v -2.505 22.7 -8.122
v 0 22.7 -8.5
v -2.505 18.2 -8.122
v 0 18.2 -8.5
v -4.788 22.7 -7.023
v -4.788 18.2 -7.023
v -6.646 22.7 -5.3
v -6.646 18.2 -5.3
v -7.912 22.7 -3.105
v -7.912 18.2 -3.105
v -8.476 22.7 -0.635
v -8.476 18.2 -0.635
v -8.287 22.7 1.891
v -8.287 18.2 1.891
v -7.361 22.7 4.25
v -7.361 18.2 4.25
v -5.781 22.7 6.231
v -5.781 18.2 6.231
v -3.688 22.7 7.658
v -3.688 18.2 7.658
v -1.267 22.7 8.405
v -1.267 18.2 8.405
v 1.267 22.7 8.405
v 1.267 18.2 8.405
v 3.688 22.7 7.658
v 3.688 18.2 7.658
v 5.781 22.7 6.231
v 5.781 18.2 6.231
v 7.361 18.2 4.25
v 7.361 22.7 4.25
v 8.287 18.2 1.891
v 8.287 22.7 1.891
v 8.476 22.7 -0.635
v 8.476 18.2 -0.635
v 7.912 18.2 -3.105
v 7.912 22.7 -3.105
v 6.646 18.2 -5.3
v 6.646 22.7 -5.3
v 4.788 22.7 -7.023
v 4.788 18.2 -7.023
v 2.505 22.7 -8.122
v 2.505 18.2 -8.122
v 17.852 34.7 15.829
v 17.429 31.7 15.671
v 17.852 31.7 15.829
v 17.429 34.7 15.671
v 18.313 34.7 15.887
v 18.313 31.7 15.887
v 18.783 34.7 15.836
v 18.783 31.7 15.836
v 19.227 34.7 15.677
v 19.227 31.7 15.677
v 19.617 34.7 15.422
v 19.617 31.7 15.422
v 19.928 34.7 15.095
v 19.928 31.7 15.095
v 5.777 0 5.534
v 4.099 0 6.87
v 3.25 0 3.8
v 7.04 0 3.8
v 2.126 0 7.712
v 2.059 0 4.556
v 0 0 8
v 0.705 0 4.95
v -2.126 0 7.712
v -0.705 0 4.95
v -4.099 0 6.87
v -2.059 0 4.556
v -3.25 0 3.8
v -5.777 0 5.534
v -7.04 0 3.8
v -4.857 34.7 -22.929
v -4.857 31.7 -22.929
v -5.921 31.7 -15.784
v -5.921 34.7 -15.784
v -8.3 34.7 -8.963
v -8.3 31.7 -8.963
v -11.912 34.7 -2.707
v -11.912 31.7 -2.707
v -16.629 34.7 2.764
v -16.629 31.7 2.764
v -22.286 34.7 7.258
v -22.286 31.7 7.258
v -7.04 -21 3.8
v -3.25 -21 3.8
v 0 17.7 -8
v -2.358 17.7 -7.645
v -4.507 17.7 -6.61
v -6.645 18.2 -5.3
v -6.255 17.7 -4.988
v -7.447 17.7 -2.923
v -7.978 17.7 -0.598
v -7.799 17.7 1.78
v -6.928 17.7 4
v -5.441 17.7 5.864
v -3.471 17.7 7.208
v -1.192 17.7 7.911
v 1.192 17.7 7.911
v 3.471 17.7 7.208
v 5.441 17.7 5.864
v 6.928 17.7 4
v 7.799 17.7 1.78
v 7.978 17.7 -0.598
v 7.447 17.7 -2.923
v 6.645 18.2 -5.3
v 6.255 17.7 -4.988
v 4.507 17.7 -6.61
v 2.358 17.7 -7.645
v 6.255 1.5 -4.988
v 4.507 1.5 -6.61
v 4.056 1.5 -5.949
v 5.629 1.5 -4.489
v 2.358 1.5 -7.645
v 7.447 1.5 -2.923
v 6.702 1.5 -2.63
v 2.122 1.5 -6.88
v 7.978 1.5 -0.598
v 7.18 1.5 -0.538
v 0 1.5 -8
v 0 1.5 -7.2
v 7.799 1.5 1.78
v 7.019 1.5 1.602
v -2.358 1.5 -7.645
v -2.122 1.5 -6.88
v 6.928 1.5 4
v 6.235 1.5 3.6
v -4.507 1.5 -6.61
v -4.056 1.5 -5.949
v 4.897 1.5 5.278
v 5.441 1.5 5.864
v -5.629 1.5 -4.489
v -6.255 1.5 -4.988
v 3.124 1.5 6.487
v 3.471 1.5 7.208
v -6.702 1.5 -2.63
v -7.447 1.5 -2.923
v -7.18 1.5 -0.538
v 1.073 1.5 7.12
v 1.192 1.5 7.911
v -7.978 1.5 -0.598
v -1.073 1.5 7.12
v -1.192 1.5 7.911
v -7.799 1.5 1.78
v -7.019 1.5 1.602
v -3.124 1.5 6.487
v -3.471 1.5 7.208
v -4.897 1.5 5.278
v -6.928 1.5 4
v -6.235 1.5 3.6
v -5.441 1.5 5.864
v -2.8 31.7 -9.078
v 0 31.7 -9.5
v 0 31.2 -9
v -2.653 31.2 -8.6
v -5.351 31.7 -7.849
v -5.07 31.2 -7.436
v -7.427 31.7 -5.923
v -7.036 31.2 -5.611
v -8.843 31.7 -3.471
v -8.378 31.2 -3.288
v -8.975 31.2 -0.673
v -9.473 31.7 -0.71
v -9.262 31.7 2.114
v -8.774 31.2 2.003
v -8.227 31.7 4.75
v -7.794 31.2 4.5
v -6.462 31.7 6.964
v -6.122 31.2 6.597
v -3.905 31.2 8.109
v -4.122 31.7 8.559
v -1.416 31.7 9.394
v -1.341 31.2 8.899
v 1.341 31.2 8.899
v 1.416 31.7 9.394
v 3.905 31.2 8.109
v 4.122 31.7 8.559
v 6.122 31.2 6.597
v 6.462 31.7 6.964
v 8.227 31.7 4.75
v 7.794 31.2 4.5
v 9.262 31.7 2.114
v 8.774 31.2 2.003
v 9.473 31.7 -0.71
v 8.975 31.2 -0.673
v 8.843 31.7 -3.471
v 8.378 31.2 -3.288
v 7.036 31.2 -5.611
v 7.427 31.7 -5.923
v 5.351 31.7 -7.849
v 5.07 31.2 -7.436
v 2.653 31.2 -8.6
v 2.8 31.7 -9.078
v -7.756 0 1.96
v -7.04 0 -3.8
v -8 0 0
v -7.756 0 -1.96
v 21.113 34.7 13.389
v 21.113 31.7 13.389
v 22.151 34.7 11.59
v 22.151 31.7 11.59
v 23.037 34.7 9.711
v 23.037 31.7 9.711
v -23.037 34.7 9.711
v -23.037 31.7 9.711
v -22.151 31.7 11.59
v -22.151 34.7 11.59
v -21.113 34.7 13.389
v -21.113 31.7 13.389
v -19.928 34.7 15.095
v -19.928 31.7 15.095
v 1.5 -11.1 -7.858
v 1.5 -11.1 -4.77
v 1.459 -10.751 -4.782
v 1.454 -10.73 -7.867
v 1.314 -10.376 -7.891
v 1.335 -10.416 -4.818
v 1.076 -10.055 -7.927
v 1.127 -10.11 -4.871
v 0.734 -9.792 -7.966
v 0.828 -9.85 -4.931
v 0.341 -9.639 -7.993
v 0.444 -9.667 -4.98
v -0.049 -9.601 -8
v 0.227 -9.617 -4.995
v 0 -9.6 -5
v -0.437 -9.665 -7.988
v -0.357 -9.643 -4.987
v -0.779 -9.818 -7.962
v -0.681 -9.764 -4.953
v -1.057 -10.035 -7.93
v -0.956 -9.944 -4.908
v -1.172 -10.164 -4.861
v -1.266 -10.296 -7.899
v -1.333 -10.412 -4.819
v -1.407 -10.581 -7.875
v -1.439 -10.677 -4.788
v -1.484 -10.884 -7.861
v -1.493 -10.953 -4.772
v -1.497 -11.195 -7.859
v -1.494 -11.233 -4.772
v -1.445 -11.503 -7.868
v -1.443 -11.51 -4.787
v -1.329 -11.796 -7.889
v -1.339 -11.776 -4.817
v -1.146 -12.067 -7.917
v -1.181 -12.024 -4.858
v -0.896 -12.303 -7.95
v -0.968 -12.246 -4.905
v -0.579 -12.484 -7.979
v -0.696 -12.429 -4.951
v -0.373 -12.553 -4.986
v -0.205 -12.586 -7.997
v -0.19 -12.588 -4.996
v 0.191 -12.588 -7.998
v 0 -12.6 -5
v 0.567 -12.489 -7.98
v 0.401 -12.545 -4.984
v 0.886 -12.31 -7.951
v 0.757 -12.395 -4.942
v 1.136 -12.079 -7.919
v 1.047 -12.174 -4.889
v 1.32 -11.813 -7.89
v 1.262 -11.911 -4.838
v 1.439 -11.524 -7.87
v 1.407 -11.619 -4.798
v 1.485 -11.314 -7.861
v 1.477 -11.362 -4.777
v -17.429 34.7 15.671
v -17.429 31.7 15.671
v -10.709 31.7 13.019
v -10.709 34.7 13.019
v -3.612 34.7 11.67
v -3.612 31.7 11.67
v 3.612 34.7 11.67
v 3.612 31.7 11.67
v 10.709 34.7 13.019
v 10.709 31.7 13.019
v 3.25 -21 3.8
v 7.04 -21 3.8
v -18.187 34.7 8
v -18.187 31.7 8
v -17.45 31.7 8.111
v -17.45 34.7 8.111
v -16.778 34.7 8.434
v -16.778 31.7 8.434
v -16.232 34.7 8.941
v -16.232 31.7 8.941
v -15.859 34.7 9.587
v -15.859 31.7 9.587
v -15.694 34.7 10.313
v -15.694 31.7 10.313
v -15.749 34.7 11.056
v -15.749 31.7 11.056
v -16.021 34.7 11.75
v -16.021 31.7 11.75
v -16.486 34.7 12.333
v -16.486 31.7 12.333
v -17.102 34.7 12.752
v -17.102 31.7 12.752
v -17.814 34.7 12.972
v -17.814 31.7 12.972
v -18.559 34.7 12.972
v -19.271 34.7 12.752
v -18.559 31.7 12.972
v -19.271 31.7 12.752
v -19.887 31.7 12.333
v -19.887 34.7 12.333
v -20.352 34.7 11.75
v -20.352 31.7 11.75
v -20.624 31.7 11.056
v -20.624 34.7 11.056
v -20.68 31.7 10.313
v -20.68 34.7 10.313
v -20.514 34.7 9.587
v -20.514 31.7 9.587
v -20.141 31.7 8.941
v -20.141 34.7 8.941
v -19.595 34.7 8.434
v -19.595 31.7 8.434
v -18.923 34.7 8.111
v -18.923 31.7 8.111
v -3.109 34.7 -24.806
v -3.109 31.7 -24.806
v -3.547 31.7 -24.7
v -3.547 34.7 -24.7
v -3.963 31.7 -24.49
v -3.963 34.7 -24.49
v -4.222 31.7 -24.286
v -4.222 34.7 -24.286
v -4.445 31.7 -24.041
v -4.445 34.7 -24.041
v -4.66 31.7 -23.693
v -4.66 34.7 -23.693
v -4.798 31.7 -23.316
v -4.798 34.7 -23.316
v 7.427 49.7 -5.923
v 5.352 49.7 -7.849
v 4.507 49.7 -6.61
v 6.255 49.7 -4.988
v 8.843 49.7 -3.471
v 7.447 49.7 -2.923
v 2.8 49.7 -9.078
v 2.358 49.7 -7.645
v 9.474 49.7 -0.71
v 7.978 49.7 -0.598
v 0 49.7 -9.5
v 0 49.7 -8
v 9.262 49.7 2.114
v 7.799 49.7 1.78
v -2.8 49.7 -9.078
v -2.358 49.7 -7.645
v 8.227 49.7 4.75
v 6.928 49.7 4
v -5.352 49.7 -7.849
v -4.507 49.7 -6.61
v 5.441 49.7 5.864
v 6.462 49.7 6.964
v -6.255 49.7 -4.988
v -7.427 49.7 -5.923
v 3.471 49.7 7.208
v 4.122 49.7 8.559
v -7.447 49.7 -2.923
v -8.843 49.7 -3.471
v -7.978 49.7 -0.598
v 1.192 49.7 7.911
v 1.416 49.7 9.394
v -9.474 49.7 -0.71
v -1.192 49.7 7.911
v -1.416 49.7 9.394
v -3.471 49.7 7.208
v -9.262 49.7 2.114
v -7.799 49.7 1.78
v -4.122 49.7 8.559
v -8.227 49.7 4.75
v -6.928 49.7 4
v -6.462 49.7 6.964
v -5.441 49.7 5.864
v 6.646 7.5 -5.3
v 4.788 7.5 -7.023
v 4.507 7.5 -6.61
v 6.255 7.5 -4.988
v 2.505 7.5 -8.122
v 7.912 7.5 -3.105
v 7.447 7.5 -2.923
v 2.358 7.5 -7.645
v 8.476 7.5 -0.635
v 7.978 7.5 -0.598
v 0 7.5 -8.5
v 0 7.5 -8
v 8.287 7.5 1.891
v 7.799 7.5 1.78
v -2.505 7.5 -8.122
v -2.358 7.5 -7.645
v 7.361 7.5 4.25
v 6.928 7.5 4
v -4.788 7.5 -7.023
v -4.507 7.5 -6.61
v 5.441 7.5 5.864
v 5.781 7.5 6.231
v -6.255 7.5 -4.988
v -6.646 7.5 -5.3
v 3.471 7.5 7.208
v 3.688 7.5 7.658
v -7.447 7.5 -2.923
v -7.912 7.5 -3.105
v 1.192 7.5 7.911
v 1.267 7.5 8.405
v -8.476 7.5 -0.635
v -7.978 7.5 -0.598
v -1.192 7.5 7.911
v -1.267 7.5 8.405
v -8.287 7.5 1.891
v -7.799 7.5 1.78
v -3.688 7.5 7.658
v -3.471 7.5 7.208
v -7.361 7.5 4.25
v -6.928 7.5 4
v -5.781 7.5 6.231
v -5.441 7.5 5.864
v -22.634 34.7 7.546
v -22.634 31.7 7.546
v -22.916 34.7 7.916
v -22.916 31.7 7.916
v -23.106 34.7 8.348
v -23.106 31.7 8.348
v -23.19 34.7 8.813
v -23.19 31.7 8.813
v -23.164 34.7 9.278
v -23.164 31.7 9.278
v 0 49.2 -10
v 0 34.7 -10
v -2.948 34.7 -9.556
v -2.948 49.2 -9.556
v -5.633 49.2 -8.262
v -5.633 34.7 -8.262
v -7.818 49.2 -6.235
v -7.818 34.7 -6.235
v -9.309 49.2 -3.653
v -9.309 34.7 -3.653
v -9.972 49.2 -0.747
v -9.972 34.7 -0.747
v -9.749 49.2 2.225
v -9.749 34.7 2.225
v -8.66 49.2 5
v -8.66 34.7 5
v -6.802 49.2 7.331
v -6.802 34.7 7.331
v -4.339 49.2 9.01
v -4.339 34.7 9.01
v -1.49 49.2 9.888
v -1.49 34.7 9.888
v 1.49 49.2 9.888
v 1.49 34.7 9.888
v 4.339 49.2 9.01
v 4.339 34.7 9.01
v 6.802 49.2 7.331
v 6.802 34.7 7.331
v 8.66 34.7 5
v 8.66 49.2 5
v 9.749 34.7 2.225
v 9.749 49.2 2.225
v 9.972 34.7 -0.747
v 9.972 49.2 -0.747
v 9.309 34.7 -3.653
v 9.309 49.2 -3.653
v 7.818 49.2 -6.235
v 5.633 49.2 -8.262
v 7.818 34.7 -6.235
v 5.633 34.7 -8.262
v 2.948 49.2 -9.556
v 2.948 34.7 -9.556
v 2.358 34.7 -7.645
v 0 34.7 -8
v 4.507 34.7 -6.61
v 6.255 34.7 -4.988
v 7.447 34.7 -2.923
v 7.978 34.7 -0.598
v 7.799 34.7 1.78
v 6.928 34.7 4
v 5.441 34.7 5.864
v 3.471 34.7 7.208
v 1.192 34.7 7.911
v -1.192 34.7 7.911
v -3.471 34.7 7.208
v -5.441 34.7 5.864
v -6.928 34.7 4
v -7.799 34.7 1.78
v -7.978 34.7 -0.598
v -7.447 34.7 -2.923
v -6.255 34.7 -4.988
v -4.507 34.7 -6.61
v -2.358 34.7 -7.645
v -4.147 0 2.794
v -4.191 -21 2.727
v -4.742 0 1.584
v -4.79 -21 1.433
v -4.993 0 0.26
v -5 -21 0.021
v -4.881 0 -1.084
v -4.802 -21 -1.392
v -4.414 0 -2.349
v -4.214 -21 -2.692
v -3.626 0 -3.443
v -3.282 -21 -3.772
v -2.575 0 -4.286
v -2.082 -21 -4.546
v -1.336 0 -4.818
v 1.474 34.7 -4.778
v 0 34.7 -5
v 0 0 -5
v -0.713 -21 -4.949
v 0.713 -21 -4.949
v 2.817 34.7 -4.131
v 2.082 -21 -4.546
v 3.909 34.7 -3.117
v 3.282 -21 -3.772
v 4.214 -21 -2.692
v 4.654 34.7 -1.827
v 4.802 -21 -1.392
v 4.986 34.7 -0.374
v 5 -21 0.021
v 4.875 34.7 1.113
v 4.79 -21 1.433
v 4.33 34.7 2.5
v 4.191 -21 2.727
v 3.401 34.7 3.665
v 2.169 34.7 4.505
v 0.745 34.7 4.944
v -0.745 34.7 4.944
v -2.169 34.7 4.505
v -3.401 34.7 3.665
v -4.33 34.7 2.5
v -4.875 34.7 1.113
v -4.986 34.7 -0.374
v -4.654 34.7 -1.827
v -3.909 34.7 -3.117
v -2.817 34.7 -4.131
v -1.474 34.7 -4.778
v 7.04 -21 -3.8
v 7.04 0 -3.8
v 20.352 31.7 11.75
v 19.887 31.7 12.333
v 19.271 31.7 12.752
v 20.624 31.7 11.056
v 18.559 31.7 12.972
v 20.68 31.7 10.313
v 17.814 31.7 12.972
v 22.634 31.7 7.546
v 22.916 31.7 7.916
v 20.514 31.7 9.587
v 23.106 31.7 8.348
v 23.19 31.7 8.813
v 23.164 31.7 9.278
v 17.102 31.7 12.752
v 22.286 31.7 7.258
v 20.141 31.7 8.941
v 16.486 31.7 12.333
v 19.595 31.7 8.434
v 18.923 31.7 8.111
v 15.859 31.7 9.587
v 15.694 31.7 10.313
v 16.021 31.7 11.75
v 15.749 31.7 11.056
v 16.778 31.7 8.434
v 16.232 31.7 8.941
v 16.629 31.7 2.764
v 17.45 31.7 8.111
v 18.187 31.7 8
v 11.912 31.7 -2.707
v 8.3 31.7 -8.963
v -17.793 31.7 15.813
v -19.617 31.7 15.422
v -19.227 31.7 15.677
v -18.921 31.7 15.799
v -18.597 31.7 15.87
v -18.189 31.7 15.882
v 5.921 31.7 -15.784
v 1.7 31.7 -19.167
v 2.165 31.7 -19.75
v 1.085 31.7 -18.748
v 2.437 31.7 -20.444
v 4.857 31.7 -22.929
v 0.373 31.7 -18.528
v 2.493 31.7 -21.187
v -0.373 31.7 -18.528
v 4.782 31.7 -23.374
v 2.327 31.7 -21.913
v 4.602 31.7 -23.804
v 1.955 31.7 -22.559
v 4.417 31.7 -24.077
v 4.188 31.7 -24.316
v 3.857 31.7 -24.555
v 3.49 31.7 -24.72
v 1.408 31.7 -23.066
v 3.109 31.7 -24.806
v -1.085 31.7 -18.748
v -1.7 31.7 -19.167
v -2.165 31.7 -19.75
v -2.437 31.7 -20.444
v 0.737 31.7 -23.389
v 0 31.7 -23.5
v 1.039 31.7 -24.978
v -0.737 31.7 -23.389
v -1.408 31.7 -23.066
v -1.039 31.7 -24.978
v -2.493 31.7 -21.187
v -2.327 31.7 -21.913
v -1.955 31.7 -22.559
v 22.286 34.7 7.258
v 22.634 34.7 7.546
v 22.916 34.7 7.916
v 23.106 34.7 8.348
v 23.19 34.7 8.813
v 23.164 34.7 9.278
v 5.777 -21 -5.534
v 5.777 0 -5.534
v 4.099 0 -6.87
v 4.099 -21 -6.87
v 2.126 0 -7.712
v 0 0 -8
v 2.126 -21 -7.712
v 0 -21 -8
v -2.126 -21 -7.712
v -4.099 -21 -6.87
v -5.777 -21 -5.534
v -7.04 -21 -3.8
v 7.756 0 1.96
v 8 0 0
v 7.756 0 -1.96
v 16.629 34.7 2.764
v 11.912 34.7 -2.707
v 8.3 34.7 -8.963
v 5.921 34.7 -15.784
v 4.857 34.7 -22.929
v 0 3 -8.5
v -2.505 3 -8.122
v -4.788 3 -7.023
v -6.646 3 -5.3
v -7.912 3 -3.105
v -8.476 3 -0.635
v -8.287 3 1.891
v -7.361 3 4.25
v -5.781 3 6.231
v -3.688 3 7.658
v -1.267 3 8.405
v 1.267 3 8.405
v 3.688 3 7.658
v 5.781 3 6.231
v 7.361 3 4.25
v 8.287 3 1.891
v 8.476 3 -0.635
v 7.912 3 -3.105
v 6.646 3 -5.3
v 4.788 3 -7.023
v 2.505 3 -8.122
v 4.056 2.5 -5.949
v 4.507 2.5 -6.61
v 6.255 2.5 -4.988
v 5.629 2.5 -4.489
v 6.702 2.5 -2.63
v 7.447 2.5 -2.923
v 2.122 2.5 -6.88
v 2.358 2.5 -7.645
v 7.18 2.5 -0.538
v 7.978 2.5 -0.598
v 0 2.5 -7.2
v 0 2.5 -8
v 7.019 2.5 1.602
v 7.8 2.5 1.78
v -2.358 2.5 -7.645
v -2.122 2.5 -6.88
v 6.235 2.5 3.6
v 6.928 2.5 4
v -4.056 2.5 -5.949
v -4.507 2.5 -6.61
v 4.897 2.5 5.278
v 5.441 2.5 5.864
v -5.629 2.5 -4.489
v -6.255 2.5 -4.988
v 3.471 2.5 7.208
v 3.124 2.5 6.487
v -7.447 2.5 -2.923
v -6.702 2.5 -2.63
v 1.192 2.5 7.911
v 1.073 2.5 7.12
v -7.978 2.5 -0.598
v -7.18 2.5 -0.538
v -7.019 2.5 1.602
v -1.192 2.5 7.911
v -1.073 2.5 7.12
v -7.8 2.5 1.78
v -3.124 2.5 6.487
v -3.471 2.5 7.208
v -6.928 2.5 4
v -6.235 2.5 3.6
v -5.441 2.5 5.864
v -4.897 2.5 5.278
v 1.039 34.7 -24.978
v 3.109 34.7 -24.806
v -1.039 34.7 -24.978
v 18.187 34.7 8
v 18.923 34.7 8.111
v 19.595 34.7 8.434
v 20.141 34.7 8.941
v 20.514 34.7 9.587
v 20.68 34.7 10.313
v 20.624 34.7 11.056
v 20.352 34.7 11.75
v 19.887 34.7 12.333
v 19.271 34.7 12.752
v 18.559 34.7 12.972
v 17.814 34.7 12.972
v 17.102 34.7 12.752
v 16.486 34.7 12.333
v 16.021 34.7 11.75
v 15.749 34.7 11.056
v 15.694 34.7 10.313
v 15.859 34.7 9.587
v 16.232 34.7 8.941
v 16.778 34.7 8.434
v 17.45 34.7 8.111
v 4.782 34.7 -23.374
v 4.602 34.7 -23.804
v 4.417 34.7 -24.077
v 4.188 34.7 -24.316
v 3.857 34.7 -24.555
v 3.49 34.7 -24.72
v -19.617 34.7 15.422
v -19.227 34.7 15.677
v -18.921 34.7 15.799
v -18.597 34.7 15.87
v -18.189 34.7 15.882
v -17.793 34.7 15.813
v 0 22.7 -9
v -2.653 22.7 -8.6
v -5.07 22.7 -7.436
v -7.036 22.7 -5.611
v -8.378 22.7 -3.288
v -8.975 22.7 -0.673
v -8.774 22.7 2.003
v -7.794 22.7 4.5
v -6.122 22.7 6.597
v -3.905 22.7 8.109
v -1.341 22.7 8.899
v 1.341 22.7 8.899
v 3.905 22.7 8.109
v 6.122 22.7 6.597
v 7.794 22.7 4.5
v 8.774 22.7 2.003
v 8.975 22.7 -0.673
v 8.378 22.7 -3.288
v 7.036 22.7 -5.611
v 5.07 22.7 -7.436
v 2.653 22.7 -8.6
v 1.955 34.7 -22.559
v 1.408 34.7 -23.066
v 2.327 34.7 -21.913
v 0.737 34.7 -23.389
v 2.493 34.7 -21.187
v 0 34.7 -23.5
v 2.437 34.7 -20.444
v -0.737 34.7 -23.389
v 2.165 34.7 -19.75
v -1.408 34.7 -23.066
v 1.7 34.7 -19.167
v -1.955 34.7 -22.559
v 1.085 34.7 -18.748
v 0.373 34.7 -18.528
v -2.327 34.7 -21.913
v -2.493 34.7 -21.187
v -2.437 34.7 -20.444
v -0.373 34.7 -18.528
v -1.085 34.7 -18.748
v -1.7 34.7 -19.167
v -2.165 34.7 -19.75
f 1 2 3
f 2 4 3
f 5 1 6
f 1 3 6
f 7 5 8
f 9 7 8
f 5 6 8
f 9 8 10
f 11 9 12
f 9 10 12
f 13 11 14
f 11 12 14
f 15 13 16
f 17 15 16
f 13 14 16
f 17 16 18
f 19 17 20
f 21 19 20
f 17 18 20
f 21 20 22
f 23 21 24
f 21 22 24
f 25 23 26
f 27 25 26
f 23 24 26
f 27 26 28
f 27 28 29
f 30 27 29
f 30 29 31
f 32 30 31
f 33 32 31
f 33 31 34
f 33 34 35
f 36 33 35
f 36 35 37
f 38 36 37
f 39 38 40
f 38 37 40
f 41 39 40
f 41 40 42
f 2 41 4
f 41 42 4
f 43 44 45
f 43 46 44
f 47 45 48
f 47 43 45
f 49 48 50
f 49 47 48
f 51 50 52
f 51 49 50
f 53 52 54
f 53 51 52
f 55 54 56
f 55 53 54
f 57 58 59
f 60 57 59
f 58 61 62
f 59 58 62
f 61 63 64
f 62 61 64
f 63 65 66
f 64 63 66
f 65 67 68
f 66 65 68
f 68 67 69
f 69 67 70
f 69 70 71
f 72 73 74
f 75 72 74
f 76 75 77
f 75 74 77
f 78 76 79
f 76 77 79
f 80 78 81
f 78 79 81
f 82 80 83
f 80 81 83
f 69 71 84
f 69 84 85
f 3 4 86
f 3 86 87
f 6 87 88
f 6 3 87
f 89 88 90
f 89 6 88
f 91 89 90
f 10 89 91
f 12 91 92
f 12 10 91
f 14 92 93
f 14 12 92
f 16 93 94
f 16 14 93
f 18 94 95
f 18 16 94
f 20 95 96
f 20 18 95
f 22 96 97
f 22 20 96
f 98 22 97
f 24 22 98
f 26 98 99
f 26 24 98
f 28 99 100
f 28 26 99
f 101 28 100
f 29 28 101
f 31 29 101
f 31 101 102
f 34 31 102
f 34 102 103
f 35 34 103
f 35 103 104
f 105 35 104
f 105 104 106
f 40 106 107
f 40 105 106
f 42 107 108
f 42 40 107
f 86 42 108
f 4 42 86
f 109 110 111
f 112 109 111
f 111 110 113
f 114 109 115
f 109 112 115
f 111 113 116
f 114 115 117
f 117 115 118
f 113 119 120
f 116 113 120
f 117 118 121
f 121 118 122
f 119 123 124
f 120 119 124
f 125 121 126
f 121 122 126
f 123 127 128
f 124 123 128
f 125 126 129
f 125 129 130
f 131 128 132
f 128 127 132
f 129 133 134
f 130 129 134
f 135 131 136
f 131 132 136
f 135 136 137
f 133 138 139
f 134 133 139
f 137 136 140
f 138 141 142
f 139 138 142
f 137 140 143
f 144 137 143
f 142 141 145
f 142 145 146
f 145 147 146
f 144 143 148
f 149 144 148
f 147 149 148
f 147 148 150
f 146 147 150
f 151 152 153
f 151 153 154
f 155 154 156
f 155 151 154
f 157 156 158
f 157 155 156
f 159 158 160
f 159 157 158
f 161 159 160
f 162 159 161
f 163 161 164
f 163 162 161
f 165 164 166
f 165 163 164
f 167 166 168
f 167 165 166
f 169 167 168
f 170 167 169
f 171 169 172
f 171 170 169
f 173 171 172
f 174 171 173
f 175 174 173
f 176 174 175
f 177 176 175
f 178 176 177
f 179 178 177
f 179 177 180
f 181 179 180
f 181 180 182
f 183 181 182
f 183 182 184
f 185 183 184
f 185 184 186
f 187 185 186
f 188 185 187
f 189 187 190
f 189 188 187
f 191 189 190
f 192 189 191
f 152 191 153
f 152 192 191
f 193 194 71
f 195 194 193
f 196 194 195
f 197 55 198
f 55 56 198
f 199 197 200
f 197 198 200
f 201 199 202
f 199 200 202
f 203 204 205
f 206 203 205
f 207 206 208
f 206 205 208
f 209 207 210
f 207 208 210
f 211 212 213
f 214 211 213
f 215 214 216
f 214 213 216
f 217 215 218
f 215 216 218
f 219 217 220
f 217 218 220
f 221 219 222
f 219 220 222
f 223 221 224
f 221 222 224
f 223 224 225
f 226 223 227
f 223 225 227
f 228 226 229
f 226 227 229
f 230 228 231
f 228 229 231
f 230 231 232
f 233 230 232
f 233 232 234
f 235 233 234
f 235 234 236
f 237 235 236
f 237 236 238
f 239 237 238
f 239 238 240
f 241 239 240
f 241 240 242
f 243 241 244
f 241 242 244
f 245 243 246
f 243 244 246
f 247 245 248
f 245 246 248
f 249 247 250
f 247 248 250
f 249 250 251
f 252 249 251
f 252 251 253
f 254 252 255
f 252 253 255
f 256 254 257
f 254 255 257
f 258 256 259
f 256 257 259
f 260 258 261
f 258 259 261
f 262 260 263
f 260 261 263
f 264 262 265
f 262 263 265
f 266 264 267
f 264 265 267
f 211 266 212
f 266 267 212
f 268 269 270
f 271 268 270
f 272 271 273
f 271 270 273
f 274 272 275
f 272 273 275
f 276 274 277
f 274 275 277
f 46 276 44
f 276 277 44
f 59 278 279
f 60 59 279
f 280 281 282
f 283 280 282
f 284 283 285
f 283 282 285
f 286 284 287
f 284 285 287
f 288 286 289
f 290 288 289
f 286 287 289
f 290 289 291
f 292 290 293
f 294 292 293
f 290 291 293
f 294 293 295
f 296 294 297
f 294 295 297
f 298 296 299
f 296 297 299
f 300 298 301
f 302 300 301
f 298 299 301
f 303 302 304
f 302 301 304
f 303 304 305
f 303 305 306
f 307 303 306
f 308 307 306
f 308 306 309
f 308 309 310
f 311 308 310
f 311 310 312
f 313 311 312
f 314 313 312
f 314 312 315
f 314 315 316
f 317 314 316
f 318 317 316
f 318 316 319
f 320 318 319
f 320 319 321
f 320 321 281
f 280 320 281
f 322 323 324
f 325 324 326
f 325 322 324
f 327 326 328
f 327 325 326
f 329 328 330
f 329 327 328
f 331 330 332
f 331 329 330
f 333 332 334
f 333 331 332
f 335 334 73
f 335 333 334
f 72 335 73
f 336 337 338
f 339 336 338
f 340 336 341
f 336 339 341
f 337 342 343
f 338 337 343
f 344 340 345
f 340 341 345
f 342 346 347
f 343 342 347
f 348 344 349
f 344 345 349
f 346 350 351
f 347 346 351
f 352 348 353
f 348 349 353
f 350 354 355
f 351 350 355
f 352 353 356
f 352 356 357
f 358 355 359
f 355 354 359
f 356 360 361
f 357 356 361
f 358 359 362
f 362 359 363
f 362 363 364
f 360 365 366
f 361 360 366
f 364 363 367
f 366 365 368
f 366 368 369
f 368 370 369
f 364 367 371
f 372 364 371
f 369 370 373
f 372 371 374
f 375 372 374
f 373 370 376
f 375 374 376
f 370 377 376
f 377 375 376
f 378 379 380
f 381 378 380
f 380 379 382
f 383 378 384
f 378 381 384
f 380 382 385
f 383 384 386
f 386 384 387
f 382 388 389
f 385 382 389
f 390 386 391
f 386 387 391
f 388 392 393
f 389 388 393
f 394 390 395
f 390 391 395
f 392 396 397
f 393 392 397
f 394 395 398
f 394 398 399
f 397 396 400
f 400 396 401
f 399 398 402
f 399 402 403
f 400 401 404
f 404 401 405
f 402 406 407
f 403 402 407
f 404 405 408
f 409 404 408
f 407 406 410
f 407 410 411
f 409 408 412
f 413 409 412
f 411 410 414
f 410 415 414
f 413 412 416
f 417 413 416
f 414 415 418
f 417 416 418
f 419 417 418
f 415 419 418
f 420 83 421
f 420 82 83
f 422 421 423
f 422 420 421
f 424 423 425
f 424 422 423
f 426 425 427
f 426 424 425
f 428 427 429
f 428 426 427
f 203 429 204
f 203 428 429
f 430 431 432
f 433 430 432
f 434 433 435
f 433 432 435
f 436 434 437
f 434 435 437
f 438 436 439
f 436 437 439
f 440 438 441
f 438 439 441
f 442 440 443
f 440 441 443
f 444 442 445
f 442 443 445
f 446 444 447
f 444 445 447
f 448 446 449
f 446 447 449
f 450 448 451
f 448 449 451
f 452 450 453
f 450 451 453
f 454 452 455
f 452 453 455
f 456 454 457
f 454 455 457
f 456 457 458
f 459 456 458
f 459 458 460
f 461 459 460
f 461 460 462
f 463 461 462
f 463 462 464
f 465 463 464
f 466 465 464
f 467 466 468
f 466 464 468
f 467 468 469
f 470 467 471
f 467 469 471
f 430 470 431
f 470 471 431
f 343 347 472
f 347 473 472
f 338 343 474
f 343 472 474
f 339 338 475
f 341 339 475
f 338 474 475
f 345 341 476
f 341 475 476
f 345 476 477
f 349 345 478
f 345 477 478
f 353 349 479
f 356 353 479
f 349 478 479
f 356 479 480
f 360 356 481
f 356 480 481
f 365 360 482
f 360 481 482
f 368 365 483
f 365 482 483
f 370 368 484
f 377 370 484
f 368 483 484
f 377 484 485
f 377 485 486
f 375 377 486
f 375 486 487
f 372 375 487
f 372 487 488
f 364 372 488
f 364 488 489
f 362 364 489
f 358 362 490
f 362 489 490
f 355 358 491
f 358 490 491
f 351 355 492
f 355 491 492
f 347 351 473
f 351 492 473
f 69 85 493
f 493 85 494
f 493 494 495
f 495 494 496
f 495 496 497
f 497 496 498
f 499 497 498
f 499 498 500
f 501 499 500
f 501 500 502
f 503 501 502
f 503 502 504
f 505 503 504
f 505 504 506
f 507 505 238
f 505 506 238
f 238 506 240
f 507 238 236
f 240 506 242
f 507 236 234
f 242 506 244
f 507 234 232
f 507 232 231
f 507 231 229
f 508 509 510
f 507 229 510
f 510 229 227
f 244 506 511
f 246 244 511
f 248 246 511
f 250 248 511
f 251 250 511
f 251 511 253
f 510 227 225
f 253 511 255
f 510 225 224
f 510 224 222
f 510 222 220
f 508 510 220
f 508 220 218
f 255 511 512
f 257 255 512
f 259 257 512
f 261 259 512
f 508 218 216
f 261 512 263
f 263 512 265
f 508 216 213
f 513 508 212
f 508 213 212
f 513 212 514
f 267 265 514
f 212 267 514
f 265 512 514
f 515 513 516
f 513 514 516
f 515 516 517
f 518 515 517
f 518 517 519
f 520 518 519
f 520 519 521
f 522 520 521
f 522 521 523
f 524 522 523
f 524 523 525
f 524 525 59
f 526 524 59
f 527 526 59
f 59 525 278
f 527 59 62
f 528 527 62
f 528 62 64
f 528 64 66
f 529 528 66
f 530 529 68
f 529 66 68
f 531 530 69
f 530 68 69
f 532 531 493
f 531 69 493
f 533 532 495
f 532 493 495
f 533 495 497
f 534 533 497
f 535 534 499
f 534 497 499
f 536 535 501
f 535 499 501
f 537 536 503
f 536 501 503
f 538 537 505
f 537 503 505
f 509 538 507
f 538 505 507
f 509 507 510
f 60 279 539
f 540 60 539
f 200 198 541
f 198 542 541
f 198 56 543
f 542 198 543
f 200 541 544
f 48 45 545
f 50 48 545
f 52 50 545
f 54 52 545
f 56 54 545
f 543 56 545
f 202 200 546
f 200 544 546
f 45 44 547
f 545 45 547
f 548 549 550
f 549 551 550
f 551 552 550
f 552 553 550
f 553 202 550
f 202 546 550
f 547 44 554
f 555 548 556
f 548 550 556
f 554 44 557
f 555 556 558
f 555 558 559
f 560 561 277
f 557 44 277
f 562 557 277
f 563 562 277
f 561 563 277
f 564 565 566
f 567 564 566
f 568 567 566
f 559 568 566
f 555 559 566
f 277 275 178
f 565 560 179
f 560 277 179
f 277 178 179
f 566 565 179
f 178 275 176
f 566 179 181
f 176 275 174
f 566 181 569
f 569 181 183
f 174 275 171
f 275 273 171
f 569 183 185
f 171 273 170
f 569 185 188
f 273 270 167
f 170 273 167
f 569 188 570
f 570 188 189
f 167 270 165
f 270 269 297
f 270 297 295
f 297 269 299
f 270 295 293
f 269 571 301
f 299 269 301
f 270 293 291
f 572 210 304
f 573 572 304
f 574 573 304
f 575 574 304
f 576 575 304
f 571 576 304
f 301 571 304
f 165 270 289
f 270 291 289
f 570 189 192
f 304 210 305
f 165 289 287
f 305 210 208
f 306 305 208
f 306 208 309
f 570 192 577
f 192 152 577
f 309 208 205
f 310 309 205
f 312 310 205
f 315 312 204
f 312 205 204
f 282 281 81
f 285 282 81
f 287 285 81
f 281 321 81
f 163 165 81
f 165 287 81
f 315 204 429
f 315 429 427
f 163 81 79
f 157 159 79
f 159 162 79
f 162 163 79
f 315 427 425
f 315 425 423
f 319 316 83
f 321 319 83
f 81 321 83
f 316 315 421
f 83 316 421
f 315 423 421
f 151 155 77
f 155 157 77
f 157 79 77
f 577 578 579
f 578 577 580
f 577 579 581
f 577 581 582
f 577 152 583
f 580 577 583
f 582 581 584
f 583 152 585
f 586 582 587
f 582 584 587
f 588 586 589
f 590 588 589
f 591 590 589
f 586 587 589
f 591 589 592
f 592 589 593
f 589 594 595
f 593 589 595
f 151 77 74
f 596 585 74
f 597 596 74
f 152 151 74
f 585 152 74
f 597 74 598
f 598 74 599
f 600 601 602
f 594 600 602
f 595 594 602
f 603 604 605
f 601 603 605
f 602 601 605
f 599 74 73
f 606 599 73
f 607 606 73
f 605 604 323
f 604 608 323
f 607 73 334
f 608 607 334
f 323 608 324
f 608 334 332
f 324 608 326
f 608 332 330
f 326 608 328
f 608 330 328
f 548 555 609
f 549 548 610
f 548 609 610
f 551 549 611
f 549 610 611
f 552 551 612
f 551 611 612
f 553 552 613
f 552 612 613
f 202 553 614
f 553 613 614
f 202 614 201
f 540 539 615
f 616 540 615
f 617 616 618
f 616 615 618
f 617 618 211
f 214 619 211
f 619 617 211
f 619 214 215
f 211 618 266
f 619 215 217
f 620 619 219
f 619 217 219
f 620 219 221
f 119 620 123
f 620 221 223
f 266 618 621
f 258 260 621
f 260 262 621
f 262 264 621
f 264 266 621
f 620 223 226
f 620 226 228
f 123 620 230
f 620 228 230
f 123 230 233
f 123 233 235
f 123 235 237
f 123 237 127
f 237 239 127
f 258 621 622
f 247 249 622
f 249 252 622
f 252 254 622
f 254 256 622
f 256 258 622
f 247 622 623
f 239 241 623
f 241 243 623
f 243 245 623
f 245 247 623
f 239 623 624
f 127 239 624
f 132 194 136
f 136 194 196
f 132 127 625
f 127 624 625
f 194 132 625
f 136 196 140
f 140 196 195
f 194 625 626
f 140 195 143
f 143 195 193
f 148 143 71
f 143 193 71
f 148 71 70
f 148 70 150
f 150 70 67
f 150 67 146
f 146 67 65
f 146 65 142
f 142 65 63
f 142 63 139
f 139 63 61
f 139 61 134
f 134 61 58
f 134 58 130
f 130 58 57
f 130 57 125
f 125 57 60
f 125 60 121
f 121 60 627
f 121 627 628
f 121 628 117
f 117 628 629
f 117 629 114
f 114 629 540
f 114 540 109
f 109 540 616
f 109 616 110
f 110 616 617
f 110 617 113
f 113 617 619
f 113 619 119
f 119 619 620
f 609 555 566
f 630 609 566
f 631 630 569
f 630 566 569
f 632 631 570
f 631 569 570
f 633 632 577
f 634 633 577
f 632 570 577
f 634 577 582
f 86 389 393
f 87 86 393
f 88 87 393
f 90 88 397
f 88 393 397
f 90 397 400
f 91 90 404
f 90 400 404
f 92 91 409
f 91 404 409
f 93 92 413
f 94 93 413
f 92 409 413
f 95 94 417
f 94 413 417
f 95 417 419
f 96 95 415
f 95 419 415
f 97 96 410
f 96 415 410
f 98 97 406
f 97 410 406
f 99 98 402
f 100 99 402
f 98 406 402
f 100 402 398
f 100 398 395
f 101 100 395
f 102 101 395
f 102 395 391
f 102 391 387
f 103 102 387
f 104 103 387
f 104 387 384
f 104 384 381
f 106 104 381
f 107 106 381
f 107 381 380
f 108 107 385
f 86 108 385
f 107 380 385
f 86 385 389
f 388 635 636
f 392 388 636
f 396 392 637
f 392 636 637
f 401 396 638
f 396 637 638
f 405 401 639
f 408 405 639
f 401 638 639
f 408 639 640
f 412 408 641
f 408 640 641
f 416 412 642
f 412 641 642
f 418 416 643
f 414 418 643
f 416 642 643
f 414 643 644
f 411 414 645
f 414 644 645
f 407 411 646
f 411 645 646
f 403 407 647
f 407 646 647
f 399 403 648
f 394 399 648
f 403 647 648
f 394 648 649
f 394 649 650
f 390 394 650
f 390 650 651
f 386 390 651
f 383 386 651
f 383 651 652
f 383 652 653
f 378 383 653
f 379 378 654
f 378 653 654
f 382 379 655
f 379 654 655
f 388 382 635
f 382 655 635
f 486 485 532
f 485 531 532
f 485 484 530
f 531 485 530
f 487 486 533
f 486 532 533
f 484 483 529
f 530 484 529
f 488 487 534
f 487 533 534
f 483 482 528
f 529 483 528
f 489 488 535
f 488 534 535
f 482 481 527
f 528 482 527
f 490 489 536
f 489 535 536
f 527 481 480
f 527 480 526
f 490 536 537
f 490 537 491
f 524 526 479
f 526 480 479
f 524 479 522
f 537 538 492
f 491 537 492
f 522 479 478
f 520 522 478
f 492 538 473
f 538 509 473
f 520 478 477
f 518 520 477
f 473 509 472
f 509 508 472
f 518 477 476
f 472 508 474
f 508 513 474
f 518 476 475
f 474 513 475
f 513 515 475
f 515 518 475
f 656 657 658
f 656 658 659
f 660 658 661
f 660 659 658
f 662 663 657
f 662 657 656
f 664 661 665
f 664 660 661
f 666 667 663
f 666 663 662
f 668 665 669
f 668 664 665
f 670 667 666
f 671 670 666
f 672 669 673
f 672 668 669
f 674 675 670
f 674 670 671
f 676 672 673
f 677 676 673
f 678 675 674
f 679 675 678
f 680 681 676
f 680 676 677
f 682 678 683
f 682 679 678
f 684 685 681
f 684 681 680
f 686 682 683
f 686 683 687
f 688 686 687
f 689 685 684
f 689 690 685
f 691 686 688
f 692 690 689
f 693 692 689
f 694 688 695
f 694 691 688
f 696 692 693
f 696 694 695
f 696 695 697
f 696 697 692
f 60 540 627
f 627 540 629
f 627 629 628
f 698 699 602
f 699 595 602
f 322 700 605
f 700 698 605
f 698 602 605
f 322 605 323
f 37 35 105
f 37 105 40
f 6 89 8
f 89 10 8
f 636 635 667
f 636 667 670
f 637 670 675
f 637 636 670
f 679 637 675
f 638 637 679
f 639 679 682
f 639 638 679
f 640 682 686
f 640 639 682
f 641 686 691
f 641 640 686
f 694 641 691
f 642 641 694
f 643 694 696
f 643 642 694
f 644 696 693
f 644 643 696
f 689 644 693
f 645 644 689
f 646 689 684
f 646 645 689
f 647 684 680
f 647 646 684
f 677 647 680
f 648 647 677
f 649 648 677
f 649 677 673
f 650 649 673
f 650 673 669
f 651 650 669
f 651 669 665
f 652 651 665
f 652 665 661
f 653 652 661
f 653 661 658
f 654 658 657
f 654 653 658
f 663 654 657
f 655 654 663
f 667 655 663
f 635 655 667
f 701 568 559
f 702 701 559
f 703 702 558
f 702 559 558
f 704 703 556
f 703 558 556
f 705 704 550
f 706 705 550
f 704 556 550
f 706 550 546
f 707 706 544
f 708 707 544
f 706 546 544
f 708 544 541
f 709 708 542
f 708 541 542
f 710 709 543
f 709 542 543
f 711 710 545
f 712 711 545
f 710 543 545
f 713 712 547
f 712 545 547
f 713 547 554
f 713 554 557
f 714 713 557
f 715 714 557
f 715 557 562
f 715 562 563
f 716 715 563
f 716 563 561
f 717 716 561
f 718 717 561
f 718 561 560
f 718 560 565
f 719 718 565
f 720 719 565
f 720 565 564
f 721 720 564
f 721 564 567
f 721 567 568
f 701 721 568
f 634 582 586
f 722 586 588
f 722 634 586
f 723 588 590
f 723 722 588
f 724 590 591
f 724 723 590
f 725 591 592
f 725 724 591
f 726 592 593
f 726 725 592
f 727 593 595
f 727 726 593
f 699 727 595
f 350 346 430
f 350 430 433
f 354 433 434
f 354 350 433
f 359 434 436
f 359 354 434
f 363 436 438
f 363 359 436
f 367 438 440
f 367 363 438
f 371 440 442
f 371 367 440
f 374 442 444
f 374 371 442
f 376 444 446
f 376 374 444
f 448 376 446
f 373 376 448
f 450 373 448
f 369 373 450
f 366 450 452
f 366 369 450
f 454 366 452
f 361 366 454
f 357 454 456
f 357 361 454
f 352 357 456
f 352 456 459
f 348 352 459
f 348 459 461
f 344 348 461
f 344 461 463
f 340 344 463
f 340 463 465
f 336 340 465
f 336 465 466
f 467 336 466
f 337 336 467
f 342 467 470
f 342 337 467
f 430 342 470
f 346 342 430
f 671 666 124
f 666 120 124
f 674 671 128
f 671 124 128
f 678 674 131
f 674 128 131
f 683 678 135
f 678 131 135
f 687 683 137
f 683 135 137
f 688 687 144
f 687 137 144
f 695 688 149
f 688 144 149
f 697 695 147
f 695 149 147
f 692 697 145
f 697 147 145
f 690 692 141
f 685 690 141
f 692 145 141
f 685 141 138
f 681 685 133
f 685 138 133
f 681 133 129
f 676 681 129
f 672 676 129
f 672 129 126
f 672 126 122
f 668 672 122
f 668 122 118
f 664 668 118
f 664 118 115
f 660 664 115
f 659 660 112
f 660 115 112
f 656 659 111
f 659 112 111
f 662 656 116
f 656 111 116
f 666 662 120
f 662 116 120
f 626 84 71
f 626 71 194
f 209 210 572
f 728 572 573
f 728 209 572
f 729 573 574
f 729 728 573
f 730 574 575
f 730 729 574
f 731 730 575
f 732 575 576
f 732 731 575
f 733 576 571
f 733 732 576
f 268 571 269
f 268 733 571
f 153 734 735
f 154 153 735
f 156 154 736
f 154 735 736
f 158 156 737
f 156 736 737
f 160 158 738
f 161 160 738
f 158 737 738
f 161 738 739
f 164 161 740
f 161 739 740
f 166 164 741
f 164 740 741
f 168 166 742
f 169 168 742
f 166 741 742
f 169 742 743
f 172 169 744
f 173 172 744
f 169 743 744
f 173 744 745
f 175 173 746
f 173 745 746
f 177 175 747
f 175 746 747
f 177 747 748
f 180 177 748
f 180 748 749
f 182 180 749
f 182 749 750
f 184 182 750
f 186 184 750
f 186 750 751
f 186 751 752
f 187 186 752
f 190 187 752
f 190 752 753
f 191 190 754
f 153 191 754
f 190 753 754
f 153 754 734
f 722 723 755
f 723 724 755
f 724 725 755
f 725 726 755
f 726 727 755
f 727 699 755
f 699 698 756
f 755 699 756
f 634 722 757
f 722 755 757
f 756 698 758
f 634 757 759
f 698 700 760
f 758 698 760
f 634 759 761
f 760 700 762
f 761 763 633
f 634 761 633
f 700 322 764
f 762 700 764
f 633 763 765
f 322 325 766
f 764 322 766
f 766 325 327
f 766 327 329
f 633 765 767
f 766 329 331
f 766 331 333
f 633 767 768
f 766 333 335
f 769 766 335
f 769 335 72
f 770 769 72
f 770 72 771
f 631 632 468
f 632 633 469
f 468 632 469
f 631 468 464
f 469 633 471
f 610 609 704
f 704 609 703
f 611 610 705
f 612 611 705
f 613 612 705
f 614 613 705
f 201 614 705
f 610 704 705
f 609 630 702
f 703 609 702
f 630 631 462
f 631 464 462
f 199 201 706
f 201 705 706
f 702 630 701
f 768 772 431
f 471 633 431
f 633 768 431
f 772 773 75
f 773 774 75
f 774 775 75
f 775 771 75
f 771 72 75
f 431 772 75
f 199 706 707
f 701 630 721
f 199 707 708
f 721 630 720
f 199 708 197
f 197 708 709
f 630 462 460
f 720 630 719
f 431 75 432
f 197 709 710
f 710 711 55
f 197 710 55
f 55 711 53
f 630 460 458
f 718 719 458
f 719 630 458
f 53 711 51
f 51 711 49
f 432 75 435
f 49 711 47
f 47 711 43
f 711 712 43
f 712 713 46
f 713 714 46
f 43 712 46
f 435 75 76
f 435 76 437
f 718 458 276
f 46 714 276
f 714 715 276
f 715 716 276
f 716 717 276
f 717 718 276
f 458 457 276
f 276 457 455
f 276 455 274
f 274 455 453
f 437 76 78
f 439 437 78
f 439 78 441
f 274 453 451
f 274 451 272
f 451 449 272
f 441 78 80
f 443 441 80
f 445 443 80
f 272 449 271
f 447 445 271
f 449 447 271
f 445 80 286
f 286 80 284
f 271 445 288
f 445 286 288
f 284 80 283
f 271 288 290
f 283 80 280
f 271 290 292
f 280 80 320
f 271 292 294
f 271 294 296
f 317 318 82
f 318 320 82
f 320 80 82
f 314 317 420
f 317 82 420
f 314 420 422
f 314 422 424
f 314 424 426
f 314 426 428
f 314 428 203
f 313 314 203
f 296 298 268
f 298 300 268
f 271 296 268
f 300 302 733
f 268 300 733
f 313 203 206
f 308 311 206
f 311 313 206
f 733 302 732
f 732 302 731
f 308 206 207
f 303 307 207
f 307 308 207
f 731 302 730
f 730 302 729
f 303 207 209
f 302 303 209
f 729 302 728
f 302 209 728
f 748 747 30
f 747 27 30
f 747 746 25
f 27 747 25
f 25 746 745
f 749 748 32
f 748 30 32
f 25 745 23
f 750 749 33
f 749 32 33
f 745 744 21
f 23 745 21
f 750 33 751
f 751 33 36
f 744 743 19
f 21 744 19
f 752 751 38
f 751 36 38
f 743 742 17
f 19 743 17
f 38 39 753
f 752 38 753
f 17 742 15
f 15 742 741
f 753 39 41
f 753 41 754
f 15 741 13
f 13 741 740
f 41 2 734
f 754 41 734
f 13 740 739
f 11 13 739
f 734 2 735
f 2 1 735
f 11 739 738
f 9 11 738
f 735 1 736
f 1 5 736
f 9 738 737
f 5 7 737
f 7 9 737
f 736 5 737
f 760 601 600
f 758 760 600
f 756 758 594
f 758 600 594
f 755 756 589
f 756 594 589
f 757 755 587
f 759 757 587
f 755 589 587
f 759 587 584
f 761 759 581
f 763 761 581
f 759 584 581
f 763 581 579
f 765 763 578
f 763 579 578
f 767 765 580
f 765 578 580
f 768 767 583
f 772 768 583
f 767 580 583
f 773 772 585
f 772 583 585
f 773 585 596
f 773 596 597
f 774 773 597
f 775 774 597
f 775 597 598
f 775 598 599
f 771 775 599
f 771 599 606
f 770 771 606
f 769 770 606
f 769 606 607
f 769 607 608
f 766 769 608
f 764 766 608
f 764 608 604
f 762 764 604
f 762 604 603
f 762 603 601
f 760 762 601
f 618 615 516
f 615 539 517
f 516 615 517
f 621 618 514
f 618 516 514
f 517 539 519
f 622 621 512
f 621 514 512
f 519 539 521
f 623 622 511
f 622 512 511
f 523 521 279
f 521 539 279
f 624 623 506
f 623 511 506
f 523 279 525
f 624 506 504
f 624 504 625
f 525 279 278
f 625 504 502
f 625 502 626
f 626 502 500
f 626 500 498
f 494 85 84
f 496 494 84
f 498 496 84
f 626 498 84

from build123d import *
from build123d.topology import SkipClean

# Parameters (mm, degrees)
EXTRUDE_START       = 21
EXTRUDE_1_DEPTH     = 21
SKETCH_5_R          = 2.5
CUT_EXTRUDE_1_DEPTH = 64.460932864
CHAMFER_1_SIZE      = 0.5
FILLET_1_R          = 2
SKETCH_9_R          = 1.5
CUT_EXTRUDE_2_DEPTH = 62.947473135
CUT_EXTRUDE_4_DEPTH = 21


with BuildPart() as part:
    # 草图2 → 旋转1 (revolve)
    with BuildSketch(Plane.XY, mode=Mode.PRIVATE) as revolve_1_sk:
        Polygon((0, 0), (0, 49.7), (10, 49.7), (10, 34.7), (25, 34.7), (25, 31.7), (9, 31.7), (9, 22.7), (8.5, 22.7), (8.5, 18.2), (8, 18.2), (8, 7.5), (8.5, 7.5), (8.5, 2.5), (8, 2.5), (7.2, 2.5), (7.2, 1.5), (8, 1.5), (8, 0), align=None)
    revolve(revolve_1_sk.sketch.rotate(Axis((0, 0, 0), (0, 1, 0)), 90), axis=Axis((0, 0, 0), (0, 1, 0)))

    # 草图3 → 凸台-拉伸1 (add)
    with BuildSketch(Plane.XZ.offset(EXTRUDE_START)):
        with BuildLine():
            Line((-7.039886363, 3.8), (-3.249615362, 3.8))
            ThreePointArc((-3.249615362, 3.8), (0, -5), (3.249615362, 3.8))
            Line((3.249615362, 3.8), (7.039886363, 3.8))
            ThreePointArc((7.039886363, 3.8), (0, -8), (-7.039886363, 3.8))
        make_face()
    extrude(amount=-EXTRUDE_1_DEPTH)

    # 草图5 → 切除-拉伸1 (cut, through all)
    with BuildSketch(Plane.XZ.offset(-31.7)):
        with BuildLine():
            ThreePointArc((-4.80408962, -24.534072693), (-9.959292144, -5.75), (-23.649175021, 8.106572693))
            ThreePointArc((-23.649175021, 8.106572693), (-21.650635095, -12.5), (-4.80408962, -24.534072693))
        make_face()
        with BuildLine():
            ThreePointArc((25, 0), (24.659981504, 4.109174155), (23.649175021, 8.106572693))
            ThreePointArc((23.649175021, 8.106572693), (9.959292144, -5.75), (4.80408962, -24.534072693))
            ThreePointArc((4.80408962, -24.534072693), (19.301583361, -15.888639959), (25, 0))
        make_face()
        with BuildLine():
            ThreePointArc((18.8450854, 16.4275), (0, 25), (-18.8450854, 16.4275))
            ThreePointArc((-18.8450854, 16.4275), (0, 11.5), (18.8450854, 16.4275))
        make_face()
        with Locations(Location((0, -21, 0), (0, 0, 270))):
            Circle(SKETCH_5_R)
        with Locations(Location((18.186533479, 10.5, 0), (0, 0, 270))):
            Circle(SKETCH_5_R)
        with Locations(Location((-18.186533479, 10.5, 0), (0, 0, 270))):
            Circle(SKETCH_5_R)
    extrude(amount=-CUT_EXTRUDE_1_DEPTH, mode=Mode.SUBTRACT)

    # 倒角1
    chamfer_1_edges = [part.edges().sort_by_distance(p)[0] for p in [
        (0, 2.5, 8.5),
        (0, 18.2, 8),
        (0, 31.7, 9),
        (0, 49.7, 10),
    ]]
    chamfer(chamfer_1_edges, length=CHAMFER_1_SIZE - 0.0001)  # a hair under: the kernel refuses the full size

    # 圆角1
    fillet_1_edges = [part.edges().sort_by_distance(p)[0] for p in [
        (-18.8450854, 33.2, 16.4275),
        (18.8450854, 33.2, 16.4275),
        (23.649175021, 33.2, 8.106572693),
        (4.80408962, 33.2, -24.534072693),
        (-4.80408962, 33.2, -24.534072693),
        (-23.649175021, 33.2, 8.106572693),
    ]]
    fillet(fillet_1_edges, radius=FILLET_1_R)

    # 草图8 → 切除-旋转1 (revolve, cut)
    with BuildSketch(Plane.XY, mode=Mode.PRIVATE) as cut_revolve_1_sk:
        Polygon((8, 34.7), (5, 34.7), (5, 0), (0, 0), (0, 49.7), (8, 49.7), align=None)
    revolve(cut_revolve_1_sk.sketch.rotate(Axis((0, 49.7, 0), (0, -1, 0)), 270), axis=Axis((0, 49.7, 0), (0, -1, 0)), mode=Mode.SUBTRACT)

    # 草图9 → 切除-拉伸2 (cut, through all)
    with SkipClean():  # the faces are left unmerged after this step: merging them gives an invalid solid
        with BuildSketch(Plane.XY.offset(3.8)):
            with Locations((0, -11.1)):
                Circle(SKETCH_9_R)
        extrude(amount=-CUT_EXTRUDE_2_DEPTH, mode=Mode.SUBTRACT)

    # 草图11 → 切除-拉伸4 (cut)
    with SkipClean():  # the faces are left unmerged after this step: merging them gives an invalid solid
        with BuildSketch(Plane.XZ.offset(21)):
            with BuildLine():
                Line((-7.039886363, 3.8), (-7.039886363, -3.8))
                ThreePointArc((-7.039886363, -3.8), (-8, 0), (-7.039886363, 3.8))
            make_face()
            with BuildLine():
                Line((7.039886363, 3.8), (7.039886363, -3.8))
                ThreePointArc((7.039886363, -3.8), (8, 0), (7.039886363, 3.8))
            make_face()
        extrude(amount=-CUT_EXTRUDE_4_DEPTH, mode=Mode.SUBTRACT)


solid = part.part
